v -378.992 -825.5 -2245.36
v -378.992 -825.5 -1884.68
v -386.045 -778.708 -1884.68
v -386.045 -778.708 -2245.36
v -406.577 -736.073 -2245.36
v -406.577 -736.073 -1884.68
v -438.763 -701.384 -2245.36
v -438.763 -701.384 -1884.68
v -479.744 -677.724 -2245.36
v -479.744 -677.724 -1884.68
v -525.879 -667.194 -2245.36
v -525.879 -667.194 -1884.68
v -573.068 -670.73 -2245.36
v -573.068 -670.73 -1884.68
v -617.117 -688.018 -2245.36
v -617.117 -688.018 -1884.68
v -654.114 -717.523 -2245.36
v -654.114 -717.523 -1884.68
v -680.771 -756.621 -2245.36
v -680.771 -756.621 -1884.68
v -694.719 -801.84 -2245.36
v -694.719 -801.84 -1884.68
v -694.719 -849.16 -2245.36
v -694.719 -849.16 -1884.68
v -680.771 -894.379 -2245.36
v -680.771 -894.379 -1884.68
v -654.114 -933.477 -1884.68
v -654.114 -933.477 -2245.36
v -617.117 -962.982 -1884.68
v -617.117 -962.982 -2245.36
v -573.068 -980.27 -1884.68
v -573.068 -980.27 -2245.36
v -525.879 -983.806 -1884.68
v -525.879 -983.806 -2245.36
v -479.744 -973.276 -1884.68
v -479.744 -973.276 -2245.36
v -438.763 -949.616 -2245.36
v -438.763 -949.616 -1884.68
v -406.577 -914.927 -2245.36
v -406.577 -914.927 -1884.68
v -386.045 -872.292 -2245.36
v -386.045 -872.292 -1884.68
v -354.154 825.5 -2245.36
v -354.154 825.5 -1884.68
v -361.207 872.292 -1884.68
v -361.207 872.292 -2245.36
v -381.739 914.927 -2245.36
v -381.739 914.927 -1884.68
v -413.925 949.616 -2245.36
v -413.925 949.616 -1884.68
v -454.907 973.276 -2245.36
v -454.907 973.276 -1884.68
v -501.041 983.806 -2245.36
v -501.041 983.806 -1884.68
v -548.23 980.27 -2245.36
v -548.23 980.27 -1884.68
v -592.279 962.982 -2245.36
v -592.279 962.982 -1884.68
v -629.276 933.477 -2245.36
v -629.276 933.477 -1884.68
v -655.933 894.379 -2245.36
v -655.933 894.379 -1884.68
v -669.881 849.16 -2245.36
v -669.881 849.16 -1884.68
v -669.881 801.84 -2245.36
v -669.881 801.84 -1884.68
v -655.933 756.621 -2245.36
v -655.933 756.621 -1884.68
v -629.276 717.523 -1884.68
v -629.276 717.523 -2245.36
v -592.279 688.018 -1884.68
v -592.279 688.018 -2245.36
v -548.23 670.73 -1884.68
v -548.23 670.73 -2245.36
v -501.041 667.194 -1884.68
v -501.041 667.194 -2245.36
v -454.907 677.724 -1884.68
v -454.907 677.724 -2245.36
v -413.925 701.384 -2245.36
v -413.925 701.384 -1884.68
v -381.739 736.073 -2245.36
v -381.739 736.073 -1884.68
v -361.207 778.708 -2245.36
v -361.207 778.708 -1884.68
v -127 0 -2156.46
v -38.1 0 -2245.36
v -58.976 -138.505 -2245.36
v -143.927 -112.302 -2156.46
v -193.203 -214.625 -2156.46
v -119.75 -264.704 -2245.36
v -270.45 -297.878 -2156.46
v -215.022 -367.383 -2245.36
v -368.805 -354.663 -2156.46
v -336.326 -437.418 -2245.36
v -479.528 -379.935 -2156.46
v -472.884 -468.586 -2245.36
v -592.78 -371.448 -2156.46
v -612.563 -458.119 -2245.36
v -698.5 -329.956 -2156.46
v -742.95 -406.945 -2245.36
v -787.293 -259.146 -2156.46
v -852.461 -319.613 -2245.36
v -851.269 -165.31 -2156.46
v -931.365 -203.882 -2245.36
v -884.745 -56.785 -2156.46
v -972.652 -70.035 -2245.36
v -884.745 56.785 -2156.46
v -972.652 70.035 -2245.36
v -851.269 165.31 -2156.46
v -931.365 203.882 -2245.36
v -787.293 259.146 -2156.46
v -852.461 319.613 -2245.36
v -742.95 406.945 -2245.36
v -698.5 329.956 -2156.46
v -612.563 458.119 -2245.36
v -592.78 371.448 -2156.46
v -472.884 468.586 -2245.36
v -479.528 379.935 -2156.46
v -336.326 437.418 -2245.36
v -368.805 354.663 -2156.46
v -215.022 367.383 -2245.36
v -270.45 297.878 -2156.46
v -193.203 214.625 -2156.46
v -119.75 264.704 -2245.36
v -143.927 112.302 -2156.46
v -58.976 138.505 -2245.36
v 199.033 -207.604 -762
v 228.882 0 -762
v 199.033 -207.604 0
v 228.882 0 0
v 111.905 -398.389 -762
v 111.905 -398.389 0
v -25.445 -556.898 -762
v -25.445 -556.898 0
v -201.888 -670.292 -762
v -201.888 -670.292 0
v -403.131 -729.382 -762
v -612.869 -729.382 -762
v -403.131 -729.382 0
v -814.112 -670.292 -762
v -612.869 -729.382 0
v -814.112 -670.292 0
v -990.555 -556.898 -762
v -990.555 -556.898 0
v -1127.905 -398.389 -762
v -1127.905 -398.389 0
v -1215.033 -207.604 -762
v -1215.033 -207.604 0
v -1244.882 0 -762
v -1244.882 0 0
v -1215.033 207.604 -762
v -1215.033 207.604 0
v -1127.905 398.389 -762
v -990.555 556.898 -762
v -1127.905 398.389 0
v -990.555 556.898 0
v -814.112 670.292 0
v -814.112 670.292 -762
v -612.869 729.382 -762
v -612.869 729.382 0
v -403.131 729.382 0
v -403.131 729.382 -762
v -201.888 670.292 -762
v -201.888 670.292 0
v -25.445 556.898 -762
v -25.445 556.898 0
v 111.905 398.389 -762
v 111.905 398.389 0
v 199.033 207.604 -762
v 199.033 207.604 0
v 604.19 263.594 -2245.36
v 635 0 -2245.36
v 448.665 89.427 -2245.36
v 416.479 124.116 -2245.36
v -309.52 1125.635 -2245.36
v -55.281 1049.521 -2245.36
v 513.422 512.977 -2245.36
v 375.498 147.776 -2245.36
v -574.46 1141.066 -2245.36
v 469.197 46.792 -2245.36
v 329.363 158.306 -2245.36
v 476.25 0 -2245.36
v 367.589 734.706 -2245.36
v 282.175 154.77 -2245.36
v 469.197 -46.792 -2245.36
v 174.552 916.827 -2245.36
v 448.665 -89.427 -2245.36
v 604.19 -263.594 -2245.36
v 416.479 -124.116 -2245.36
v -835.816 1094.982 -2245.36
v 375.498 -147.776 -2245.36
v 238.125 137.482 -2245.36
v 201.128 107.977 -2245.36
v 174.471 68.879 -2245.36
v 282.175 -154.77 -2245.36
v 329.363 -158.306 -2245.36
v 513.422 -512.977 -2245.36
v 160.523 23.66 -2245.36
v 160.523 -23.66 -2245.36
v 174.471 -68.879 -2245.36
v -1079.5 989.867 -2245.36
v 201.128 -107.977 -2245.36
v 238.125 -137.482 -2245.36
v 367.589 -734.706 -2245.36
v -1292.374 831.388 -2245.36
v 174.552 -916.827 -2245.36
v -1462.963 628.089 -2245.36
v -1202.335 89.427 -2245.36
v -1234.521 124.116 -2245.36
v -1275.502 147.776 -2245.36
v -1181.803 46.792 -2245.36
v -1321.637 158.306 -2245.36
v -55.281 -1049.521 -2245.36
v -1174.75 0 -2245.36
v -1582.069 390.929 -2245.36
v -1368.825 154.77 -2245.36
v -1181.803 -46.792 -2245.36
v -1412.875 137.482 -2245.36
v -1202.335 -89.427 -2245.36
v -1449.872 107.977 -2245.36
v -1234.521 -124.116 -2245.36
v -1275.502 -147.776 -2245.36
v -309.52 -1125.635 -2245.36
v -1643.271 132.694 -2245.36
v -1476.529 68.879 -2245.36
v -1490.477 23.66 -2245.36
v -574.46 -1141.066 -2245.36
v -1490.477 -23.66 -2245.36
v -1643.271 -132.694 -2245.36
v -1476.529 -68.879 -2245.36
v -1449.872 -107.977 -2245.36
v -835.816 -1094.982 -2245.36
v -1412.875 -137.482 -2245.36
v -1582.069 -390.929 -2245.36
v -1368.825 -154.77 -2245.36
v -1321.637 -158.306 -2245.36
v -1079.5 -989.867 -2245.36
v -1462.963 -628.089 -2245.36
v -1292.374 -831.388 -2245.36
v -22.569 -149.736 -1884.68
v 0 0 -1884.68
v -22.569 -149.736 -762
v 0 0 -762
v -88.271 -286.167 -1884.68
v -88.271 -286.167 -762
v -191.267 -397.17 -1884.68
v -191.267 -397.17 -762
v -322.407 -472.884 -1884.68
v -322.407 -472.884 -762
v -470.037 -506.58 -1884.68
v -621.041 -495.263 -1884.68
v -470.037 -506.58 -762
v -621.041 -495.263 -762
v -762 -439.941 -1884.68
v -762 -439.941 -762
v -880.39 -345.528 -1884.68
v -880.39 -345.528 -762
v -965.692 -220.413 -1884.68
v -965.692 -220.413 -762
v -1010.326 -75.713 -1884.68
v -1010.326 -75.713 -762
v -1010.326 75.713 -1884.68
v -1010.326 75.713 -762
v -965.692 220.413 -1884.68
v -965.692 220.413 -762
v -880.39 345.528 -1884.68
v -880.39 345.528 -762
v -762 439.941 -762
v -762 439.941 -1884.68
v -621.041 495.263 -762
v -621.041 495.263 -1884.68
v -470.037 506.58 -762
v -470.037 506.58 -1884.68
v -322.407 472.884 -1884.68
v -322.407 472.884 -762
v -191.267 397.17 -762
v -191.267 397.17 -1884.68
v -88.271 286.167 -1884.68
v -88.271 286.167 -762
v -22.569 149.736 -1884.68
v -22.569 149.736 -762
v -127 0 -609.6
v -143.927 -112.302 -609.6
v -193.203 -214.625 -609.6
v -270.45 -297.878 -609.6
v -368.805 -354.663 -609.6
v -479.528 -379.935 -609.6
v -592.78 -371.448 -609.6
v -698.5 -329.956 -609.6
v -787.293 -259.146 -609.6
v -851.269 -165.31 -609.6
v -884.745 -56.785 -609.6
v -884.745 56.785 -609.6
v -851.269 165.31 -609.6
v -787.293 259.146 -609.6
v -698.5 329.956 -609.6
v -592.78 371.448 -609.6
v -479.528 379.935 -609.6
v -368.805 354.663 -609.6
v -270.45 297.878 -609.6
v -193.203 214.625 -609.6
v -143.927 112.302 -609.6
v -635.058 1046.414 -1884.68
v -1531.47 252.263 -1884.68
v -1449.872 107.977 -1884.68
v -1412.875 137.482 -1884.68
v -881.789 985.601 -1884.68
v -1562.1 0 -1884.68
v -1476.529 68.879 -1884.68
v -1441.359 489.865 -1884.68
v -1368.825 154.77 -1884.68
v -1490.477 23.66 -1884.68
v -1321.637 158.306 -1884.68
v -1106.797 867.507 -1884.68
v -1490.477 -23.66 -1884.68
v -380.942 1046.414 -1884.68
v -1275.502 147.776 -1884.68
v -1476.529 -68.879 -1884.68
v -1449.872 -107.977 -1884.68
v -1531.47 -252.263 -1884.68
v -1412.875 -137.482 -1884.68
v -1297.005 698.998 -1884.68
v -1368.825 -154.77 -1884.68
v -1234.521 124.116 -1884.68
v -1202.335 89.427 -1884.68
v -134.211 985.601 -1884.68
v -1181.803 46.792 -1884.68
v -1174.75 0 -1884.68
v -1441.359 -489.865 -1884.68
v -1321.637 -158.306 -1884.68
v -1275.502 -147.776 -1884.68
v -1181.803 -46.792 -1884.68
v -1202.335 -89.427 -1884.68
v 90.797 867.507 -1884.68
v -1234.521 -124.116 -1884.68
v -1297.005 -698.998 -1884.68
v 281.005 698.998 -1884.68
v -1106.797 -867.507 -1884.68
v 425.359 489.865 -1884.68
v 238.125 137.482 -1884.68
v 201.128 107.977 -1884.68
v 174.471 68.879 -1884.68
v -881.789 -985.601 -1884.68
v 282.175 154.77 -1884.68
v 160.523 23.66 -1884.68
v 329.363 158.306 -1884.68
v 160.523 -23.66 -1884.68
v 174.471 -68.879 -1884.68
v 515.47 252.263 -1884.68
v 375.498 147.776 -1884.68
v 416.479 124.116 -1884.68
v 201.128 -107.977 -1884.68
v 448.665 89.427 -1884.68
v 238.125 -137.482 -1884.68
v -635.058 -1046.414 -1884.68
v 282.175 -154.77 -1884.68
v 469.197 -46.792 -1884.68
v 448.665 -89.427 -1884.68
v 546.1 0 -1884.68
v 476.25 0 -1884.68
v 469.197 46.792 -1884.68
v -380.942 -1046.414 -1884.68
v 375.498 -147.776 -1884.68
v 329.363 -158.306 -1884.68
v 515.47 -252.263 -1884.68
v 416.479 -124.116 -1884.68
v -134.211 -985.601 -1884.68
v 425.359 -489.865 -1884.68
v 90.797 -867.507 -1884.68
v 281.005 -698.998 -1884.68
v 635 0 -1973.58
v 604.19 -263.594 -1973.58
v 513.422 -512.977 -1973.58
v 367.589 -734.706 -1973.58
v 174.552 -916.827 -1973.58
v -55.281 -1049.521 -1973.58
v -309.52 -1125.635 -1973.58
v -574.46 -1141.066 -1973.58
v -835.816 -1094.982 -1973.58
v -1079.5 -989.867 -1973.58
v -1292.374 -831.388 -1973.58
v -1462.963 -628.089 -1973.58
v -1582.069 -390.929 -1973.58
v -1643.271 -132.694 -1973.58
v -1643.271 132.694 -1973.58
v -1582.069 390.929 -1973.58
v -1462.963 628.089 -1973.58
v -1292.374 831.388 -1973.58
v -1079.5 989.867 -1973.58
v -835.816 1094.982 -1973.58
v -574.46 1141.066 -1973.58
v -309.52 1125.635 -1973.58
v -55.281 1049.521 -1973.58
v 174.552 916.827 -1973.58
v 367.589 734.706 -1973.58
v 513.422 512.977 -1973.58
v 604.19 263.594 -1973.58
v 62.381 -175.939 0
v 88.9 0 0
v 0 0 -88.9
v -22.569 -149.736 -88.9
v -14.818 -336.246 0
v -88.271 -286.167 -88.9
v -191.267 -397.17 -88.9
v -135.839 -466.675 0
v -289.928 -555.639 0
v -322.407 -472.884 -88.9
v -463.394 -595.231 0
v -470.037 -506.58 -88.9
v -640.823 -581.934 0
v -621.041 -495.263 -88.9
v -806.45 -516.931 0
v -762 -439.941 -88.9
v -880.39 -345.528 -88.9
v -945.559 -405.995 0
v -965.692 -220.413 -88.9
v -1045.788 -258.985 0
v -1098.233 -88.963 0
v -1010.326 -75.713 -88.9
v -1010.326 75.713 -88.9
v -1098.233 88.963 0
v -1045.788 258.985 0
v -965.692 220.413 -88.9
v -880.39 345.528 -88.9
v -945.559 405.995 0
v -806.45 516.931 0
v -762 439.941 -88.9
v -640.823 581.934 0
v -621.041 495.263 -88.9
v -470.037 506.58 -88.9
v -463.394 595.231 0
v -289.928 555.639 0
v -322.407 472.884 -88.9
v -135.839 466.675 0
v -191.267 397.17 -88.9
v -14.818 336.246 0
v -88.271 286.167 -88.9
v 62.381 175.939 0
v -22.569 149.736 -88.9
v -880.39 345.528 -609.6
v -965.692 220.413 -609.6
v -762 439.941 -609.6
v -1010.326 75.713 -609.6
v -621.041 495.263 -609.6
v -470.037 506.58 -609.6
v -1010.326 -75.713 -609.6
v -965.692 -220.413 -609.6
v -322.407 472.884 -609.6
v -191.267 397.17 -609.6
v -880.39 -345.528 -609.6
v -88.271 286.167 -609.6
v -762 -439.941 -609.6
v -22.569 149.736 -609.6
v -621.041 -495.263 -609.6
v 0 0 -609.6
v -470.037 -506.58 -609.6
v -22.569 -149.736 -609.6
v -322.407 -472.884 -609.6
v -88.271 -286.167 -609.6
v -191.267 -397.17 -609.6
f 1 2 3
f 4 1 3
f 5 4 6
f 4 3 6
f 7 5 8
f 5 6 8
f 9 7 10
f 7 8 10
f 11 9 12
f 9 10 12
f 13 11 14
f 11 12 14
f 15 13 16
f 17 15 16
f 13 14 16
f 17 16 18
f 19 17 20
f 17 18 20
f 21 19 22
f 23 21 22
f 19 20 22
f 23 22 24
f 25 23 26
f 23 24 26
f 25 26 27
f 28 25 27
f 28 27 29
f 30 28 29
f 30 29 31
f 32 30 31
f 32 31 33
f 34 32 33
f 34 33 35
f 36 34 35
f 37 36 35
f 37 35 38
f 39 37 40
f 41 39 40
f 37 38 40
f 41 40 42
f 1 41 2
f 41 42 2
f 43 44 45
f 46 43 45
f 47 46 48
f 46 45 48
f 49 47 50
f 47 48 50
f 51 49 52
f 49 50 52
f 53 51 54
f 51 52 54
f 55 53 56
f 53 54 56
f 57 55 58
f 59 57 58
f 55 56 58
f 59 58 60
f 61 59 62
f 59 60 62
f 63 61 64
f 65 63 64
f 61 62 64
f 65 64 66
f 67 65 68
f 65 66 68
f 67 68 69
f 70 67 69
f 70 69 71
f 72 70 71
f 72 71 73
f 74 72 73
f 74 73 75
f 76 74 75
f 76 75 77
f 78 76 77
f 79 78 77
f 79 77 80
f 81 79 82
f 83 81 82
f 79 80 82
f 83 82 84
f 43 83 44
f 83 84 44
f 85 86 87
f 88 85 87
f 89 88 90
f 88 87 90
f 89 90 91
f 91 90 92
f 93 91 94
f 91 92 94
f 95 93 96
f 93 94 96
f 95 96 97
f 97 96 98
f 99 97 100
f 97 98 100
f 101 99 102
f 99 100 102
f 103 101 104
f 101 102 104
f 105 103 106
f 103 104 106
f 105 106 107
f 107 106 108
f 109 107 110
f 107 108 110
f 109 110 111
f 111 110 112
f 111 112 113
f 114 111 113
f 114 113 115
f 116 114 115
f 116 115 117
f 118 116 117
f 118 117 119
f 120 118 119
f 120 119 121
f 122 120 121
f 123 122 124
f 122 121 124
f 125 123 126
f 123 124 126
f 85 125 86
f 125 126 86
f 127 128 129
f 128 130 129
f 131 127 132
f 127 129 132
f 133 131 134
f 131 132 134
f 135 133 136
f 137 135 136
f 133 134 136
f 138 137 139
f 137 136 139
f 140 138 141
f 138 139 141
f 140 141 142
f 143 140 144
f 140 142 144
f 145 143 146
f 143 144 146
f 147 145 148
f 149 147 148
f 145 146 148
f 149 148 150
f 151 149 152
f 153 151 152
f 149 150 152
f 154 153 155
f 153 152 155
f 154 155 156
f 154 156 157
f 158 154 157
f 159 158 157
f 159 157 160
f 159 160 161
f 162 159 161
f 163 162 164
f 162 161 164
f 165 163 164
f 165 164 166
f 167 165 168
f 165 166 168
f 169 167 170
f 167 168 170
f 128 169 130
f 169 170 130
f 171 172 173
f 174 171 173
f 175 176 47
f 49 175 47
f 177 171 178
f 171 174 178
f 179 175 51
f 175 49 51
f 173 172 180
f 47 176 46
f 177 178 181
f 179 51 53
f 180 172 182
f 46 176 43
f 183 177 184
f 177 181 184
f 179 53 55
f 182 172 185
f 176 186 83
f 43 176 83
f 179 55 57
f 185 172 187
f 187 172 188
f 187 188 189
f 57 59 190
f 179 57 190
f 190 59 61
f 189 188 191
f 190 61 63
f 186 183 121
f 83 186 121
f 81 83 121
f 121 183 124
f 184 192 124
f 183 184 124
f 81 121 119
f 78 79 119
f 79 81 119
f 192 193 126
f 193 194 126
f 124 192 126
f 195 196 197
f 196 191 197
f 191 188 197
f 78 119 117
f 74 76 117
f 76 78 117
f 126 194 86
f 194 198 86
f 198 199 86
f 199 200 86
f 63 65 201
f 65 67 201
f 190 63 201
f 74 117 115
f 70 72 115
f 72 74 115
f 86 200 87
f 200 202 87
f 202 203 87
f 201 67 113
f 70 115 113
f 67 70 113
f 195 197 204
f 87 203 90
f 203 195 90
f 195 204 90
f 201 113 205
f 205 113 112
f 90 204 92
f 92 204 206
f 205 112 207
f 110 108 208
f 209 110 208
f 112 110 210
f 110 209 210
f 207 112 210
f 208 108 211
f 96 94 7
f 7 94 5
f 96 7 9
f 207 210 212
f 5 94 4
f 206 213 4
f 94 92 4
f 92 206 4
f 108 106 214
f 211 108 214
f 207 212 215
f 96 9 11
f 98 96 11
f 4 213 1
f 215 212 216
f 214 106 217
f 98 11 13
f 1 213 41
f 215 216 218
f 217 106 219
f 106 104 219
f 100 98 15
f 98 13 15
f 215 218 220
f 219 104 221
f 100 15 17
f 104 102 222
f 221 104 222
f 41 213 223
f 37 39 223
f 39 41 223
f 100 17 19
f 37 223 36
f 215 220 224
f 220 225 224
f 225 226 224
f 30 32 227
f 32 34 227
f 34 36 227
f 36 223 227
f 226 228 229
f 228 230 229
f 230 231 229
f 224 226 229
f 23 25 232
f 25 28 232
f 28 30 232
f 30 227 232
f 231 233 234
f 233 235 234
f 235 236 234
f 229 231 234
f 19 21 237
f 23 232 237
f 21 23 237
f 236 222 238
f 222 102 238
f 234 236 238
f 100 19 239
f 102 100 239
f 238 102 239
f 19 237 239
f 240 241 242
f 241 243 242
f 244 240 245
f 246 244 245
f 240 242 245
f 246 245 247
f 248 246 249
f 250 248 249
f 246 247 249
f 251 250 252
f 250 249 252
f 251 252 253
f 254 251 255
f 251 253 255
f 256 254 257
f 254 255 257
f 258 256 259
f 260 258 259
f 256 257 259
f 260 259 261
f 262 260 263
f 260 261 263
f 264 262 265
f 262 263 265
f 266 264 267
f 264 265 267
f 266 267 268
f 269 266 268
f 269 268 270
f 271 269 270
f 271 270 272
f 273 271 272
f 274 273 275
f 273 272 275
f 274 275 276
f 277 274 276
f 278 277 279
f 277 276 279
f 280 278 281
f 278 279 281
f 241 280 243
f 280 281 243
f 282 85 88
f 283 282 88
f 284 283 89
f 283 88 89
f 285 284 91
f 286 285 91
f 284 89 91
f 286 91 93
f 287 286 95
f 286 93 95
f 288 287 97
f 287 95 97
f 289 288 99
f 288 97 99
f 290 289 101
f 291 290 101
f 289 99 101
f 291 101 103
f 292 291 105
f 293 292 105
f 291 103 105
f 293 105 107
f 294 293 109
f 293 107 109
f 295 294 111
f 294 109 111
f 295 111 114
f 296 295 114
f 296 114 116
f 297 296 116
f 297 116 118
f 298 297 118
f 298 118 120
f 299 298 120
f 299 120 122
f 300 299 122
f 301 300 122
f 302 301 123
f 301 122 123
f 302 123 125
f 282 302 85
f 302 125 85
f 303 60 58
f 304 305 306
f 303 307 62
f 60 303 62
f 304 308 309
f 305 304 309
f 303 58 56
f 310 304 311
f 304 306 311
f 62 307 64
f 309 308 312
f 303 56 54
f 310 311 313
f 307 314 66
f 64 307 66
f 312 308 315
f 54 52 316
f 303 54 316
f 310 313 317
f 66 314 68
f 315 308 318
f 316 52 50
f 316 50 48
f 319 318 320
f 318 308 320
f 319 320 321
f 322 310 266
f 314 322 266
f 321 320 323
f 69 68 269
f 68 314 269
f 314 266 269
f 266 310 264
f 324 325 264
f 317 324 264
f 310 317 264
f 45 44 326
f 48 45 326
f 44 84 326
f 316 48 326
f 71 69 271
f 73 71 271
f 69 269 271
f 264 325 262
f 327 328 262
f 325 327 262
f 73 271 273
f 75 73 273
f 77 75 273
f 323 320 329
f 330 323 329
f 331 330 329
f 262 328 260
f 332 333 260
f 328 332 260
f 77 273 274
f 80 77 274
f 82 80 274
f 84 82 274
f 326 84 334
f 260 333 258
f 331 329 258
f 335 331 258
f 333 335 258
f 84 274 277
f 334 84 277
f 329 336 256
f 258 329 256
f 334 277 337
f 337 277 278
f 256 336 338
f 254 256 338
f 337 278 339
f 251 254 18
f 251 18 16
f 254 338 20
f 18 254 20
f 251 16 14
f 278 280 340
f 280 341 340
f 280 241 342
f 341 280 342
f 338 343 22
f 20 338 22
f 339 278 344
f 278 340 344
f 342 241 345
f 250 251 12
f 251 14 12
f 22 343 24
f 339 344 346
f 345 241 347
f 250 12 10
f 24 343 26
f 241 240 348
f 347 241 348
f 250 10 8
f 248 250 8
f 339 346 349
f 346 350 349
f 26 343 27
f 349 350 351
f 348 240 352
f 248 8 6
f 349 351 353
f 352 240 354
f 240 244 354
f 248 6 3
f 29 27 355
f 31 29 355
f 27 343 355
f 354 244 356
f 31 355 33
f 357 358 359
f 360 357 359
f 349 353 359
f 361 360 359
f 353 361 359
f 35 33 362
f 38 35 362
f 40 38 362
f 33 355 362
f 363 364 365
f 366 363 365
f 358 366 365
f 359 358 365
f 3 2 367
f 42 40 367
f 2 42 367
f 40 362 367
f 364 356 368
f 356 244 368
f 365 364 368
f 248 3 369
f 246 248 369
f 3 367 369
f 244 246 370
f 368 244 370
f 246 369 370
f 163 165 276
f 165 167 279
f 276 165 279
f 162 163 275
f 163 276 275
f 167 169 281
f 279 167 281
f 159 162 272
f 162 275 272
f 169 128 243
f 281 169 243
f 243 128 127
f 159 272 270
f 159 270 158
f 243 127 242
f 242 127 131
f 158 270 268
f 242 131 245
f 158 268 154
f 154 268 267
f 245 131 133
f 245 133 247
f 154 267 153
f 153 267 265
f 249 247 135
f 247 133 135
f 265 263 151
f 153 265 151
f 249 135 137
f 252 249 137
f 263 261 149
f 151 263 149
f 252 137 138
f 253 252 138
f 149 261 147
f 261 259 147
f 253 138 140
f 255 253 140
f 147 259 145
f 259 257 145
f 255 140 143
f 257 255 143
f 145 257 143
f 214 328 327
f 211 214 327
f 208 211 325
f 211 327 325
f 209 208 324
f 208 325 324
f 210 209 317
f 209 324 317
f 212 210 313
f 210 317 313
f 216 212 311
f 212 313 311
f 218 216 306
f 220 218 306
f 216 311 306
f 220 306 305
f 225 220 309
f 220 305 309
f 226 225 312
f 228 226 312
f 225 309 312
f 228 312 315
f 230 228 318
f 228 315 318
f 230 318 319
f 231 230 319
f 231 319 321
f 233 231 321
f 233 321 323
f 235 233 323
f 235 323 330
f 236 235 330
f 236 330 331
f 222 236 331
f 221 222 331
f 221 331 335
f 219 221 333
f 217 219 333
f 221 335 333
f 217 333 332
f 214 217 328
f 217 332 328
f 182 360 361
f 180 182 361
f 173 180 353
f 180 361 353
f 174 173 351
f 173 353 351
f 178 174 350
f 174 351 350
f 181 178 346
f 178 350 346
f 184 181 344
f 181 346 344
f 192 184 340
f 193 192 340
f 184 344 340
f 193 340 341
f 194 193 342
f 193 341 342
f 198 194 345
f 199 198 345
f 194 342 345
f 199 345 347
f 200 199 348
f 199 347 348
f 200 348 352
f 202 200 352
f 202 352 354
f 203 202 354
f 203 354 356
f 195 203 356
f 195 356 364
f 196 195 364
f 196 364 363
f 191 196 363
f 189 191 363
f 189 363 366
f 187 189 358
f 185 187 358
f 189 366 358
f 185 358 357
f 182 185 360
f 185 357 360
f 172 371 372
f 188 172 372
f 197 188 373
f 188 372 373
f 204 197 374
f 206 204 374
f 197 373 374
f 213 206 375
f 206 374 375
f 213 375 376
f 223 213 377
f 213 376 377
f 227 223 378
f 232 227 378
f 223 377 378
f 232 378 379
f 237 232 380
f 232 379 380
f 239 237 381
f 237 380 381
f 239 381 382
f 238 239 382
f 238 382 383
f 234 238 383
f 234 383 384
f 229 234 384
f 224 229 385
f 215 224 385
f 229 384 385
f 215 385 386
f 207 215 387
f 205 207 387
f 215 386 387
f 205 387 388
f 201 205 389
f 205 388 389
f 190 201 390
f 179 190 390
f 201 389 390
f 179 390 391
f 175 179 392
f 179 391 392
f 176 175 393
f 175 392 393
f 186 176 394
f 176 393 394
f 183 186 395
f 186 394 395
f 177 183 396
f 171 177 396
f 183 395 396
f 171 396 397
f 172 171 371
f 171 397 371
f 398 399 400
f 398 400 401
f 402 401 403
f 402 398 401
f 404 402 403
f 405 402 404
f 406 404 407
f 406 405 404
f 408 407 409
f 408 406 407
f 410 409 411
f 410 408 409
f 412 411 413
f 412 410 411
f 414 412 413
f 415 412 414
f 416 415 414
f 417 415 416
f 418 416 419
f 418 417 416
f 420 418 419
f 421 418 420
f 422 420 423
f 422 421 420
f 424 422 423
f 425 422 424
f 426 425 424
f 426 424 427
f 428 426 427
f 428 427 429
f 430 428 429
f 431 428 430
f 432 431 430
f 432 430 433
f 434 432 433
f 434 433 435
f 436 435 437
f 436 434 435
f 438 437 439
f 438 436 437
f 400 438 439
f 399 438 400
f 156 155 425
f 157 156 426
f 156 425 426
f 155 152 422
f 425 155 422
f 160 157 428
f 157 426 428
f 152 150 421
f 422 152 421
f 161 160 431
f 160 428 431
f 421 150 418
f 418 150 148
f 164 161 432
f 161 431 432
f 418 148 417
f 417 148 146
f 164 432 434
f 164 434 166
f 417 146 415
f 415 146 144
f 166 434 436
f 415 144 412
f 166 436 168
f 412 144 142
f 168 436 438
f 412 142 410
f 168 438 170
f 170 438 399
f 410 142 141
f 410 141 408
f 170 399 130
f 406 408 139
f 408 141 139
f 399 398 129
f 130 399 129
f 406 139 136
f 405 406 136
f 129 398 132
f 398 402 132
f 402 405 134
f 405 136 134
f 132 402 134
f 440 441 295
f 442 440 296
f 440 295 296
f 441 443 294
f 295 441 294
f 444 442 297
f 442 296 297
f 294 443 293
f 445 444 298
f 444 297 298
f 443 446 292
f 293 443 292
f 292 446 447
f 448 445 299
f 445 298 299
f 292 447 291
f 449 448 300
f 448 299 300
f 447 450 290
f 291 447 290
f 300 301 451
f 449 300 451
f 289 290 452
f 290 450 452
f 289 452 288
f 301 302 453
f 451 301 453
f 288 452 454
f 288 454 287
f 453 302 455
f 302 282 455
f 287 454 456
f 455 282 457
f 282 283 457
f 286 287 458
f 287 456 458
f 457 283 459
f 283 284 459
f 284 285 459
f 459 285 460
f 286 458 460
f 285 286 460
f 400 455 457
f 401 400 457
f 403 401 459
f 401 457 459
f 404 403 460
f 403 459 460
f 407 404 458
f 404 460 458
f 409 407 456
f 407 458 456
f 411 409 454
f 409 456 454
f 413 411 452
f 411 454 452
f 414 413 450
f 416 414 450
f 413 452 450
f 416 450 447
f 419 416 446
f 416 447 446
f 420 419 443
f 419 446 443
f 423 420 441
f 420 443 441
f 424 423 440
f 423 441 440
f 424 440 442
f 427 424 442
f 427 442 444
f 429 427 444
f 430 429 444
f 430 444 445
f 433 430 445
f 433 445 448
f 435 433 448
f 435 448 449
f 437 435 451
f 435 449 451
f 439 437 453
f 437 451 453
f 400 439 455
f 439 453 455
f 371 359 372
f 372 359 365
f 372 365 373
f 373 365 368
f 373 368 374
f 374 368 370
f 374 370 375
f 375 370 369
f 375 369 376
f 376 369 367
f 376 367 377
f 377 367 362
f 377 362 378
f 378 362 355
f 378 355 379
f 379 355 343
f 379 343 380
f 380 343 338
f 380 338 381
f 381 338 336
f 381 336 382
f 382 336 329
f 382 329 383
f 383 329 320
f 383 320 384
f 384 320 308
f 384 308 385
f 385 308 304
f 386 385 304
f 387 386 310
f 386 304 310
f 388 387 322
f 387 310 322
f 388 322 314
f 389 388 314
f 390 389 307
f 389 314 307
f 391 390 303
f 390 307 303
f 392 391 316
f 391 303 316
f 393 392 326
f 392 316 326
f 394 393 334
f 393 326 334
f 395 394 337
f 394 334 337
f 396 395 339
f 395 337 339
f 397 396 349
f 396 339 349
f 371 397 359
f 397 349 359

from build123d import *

# Parameters (mm, degrees)
F2_R     = 158.75
F3_DEPTH = 360.68
F4_DEPTH = 360.68
F5_DEPTH = 360.68
F6_DEPTH = 360.68
F7_SIZE  = 88.9
F8_SIZE  = 88.9
F9_SIZE  = 88.9


with BuildPart() as f1:
    # F0 (on Front) → F1 (revolve)
    with BuildSketch(Plane.XZ):
        Polygon((228.8821290832, 0), (0, 0), (0, -609.6), (-127, -609.6), (-127, -2245.36), (635, -2245.36), (635, -1884.68), (0, -1884.68), (0, -762), (228.8821290832, -762), align=None)
    revolve(axis=Axis((-508, 0, -886.3016366959), (0, 0, -1)))

    # F2 (on face) → F3 (cut)
    with BuildSketch(Plane.XY.offset(-1884.68)):
        with Locations((-1333.5, 0)):
            Circle(F2_R)
    extrude(amount=-F3_DEPTH, mode=Mode.SUBTRACT)

    # F2 (on face) → F4 (cut)
    with BuildSketch(Plane.XY.offset(-1884.68)):
        with Locations((-537.7423167229, -825.5)):
            Circle(F2_R)
    extrude(amount=-F4_DEPTH, mode=Mode.SUBTRACT)

    # F2 (on face) → F5 (cut)
    with BuildSketch(Plane.XY.offset(-1884.68)):
        with Locations((317.5, 0)):
            Circle(F2_R)
    extrude(amount=-F5_DEPTH, mode=Mode.SUBTRACT)

    # F2 (on face) → F6 (cut)
    with BuildSketch(Plane.XY.offset(-1884.68)):
        with Locations((-512.9044055939, 825.5)):
            Circle(F2_R)
    extrude(amount=-F6_DEPTH, mode=Mode.SUBTRACT)

    # F7
    f7_edges = [f1.edges().sort_by_distance(p)[0] for p in [
        (-889, 0, -2245.36),
    ]]
    chamfer(f7_edges, length=F7_SIZE)

    # F8
    f8_edges = [f1.edges().sort_by_distance(p)[0] for p in [
        (-1016, 0, 0),
    ]]
    chamfer(f8_edges, length=F8_SIZE)

    # F9
    f9_edges = [f1.edges().sort_by_distance(p)[0] for p in [
        (-1651, 0, -1884.68),
    ]]
    chamfer(f9_edges, length=F9_SIZE)


solid = f1.part
